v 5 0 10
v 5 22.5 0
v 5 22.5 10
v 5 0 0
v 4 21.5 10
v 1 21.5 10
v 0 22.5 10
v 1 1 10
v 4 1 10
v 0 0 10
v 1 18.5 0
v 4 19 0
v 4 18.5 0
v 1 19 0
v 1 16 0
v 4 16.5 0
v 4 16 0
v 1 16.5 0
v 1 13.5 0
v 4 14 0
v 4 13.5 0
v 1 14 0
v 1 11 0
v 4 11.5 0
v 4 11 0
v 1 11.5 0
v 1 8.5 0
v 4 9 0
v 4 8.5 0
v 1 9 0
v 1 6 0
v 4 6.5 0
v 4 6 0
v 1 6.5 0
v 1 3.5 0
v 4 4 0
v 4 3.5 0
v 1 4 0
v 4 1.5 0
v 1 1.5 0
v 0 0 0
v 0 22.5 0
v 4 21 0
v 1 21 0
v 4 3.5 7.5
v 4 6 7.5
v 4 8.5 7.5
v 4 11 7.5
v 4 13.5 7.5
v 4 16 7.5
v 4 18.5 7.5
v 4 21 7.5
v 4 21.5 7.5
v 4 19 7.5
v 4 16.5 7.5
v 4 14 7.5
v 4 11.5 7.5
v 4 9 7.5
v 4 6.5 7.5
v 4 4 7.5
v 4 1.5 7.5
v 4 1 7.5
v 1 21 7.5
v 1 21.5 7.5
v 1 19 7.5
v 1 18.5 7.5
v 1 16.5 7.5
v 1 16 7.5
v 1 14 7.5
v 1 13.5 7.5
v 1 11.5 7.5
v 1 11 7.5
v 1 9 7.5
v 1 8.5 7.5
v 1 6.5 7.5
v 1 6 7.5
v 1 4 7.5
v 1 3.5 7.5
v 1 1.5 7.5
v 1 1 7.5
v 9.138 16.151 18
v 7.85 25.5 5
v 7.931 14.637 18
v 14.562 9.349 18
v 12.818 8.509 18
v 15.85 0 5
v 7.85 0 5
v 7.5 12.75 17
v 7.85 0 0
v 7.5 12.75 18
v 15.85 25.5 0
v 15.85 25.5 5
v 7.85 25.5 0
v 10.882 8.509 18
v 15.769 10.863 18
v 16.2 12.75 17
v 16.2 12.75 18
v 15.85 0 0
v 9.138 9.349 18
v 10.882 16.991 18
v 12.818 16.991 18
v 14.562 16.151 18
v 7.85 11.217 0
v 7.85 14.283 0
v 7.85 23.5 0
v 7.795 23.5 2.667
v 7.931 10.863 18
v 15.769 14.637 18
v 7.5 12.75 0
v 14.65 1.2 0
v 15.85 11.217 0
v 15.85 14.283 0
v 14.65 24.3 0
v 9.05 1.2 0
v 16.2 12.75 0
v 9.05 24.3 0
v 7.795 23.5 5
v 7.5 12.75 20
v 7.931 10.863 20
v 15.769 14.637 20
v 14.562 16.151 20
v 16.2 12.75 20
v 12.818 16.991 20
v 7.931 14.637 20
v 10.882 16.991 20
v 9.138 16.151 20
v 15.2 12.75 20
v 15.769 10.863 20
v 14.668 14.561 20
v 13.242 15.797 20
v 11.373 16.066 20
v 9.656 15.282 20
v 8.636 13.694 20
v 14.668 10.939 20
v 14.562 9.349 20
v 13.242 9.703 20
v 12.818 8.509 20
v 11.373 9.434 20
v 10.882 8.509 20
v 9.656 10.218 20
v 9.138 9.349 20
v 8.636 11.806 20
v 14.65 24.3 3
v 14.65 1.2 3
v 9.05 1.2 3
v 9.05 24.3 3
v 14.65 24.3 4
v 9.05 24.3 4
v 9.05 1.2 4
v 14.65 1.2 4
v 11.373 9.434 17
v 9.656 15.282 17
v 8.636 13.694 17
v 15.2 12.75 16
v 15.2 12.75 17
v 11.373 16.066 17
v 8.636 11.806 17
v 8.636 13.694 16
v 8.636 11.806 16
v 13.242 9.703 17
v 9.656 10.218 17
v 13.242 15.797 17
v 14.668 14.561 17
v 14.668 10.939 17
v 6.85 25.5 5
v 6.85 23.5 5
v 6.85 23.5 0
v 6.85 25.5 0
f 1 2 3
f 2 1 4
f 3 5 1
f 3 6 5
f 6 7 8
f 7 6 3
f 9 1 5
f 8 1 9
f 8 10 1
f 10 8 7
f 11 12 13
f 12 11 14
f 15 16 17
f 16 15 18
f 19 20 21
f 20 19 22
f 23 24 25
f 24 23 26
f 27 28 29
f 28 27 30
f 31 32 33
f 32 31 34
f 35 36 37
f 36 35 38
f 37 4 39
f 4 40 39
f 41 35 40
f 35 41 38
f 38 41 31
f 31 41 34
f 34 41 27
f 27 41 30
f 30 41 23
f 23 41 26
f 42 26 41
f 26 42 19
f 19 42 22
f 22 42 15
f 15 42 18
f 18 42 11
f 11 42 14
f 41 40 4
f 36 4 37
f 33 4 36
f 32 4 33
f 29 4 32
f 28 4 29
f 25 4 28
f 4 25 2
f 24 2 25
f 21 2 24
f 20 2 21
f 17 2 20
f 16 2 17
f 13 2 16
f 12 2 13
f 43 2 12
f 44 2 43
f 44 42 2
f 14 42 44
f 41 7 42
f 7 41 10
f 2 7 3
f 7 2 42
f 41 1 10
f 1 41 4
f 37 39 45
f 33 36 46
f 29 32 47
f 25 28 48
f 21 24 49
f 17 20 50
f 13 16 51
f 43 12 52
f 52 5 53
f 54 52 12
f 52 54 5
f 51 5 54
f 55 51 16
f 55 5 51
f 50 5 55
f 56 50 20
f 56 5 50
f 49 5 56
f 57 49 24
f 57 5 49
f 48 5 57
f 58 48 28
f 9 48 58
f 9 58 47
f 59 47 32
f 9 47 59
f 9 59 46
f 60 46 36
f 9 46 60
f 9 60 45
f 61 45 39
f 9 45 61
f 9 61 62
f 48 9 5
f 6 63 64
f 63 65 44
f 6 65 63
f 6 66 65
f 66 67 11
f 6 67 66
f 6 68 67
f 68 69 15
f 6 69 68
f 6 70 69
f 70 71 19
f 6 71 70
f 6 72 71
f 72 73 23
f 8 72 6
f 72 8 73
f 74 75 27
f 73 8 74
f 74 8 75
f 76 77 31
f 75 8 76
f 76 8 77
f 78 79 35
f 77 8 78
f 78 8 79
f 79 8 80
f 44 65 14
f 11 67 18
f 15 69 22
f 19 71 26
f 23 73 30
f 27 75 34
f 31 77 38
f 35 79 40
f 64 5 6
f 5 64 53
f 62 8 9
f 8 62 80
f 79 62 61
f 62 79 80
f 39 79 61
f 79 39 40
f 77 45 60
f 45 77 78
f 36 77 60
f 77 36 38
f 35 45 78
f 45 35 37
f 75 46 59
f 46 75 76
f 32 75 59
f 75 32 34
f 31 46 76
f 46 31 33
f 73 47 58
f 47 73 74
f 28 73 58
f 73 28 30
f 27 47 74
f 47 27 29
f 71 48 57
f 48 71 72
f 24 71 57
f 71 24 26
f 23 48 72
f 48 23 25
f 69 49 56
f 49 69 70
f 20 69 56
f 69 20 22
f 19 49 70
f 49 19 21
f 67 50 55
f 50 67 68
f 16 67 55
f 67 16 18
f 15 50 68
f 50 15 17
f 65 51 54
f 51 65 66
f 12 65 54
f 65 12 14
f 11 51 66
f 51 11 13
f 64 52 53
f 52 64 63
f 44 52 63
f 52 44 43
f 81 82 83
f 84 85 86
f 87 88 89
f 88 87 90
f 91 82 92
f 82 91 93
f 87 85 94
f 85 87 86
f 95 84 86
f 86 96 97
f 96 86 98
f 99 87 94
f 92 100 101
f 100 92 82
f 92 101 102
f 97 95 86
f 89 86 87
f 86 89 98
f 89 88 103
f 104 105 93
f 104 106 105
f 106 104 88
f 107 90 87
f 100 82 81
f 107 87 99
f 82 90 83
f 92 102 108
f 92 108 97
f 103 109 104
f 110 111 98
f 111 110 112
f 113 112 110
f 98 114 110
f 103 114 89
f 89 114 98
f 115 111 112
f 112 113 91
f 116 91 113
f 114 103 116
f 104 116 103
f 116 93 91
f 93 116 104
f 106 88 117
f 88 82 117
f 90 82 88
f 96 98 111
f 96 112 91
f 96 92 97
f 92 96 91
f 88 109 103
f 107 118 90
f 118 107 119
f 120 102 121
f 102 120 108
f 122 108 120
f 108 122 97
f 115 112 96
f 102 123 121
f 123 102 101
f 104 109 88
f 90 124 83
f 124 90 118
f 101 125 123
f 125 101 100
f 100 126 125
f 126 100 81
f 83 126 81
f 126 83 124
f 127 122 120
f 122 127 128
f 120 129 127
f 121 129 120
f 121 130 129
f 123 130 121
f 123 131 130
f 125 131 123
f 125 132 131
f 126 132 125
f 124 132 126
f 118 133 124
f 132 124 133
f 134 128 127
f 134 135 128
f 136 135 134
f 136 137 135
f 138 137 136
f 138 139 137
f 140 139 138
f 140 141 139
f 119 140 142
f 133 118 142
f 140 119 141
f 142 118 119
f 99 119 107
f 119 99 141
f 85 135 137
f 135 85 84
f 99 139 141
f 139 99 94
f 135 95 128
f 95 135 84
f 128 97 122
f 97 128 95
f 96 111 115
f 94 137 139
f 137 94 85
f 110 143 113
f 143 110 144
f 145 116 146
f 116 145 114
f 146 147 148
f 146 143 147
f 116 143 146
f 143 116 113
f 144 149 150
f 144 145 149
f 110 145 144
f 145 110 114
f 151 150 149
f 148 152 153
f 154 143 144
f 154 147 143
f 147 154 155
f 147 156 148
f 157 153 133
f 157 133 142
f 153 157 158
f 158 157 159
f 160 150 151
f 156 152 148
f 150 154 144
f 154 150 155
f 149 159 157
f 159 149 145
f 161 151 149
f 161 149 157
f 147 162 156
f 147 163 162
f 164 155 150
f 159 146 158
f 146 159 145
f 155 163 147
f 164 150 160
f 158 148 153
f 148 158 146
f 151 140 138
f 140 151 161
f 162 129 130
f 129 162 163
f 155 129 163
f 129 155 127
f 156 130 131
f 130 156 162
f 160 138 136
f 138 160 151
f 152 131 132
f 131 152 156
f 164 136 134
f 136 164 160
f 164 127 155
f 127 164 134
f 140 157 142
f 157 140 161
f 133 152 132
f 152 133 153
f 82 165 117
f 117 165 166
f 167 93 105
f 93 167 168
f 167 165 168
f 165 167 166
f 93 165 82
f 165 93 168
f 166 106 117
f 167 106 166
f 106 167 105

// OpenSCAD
// Customize by adjusting the following variables
// All measurements in mm
// preview[view:north west, tilt:top]

/* [Header Shell] */

// The number of pins you want your cable shell to accommodate per column.
pins=8;

// Single (e.g. arduino uno) or Double column (arduino mega or beagleboard).
doubleColumn=0; //[0:Single Column, 1:Double Column]

// Choose whether wire separators (a wall between each conductor) will be printed. NOTE: Cura might not print the walls, check your layer view.  If Cura won't print the walls, I've found that slic3r and pronterface will.
wireSeparators=1; //[1:With Separators, 0:No Separators]

// Desired height of the header shell body.  ALL MEASUREMENTS ARE "mm"
height=10;

// Desired thickness of the shell walls.
wallThickness=1;

// MEASURED thickness of the plastic bar in the male header or plastic shell in the female header, assumed to be square for each wire (typical value is 2.5mm)
header=2.5;

//Typical female headers (for socket) require an extra mm in Y.  This accounts for that.
type=0; //[0:Plug, 1:Socket]

// Include an orientation indicator bump (automatically appears on correct shell, header or strain relief).
indicatorBump=1; //[1:With Indicator,0:Without Indicator]

// Orientation indicator position.  Choosing right or left will select which way the indicator faces.
indicatorSide=1; //[1:Rightward Orientation,0:Leftward Orientation]

// We need to account for nozzle diameter.  Enter the value for your printer here.  
nozzleDiameter=0.5;

/* [Strain Relief Shell] */

// Choose whether to include a separate strain relief shell.
strainRelief=1; //[1:Include Strain Relief Shell,0:No Strain Relief Shell]

// Enter desired radius for the exit hole from the strain relief shell.  Cat5 is generally 2.5 - 3 mm radius.  
cableRadius=2.85;

// Desired height of the strain relief shell.
strainHeight=20;

// Adjustment factors to perfect the fit between the strain relief shell and the header shell.  Lower numbers decrease the size of the inner cut (tighten), larger numbers increase the size of the inner cut (loosen).  Experiment until it is just right. 
cutAdjustmentX=-0.2;
cutAdjustmentY=-0.2;


/* [Hidden] */
//==== Don’t edit after this unless you want to change the way the script works ====
//==== basic calculations ==========================================================


outerBodyX=(2*wallThickness)+header+nozzleDiameter;
outerBodyY=(2*wallThickness)+(header*pins)+nozzleDiameter;
outerBodyZ=height;
innerBodyX=outerBodyX-(2*wallThickness);
innerBodyY=outerBodyY-(2*wallThickness);
innerBodyZ=height+2;

doubleOuterBodyX=(2*wallThickness)+(2*header)+nozzleDiameter;
doubleInnerBodyX=doubleOuterBodyX-(2*wallThickness);

innerCutTranslateX=wallThickness;
innerCutTranslateY=wallThickness;
innerCutTranslateZ=-1;

orientationIndicatorX=1;
orientationIndicatorY=2;
orientationIndicatorZ=height/2;

outerHullX=outerBodyX+(2*wallThickness)+(2*nozzleDiameter);
outerHullY=outerBodyY+(2*wallThickness)+(2*nozzleDiameter);
outerHullZ=orientationIndicatorZ;
innerHullX=outerBodyX+(2*nozzleDiameter);
innerHullY=outerBodyY+(2*nozzleDiameter);
innerHullZ=outerHullZ;

doubleOuterHullX=doubleOuterBodyX+(2*wallThickness)+(2*nozzleDiameter);
doubleInnerHullX=doubleOuterBodyX+(2*nozzleDiameter);

//==== the object ==================================================================

finalAssembly();

// draw main body
module mainBody()
{
	
	difference()
	{
		cube ([outerBodyX, outerBodyY+type, outerBodyZ]);
		translate([innerCutTranslateX, (innerCutTranslateY), innerCutTranslateZ]) 
		{
			cube ([innerBodyX, innerBodyY+type, innerBodyZ]);
		}
	}
}

// draw main body -- double column of pins
module mainBodyDouble()
{
	difference()
	{
		cube ([doubleOuterBodyX, outerBodyY+type, outerBodyZ]);
		translate([innerCutTranslateX, innerCutTranslateY, innerCutTranslateZ]) 
		{
			cube ([doubleInnerBodyX, innerBodyY+type, innerBodyZ]);
		}
	}
}

// orientation indicator on header shell (no strain relief)
module orientationIndicatorBump()
{
	if (indicatorBump==1)
	{
		color ("coral")
		{
			if (indicatorSide==1)
			{
				// orientation indicator bump
				translate([(orientationIndicatorX*-1), (outerBodyY-orientationIndicatorY), 0])
				{
					cube([orientationIndicatorX, orientationIndicatorY, orientationIndicatorZ]);
				}
			} else {
						// orientation indicator bump
				translate([(orientationIndicatorX*-1), 0, 0])
				{
					cube([orientationIndicatorX, orientationIndicatorY, orientationIndicatorZ]);
				}
			}
		}
	}
}

// orientation indicator on strain relief shell
module orientationIndicatorBumpStrainRelief()
{
	if (indicatorBump==1)
	{
		color ("coral")
		{
			if (indicatorSide==1 && doubleColumn==0)
			{
				translate([((outerBodyX+cableRadius)+(orientationIndicatorX*-1)), (outerHullY-orientationIndicatorY+type), 0])
				{
					cube([orientationIndicatorX, orientationIndicatorY, orientationIndicatorZ]);
				}
			}


			if (indicatorSide==0 && doubleColumn==0)
			{
				translate([((outerBodyX+cableRadius)+(orientationIndicatorX*-1)), type, 0])
				{
					cube([orientationIndicatorX, orientationIndicatorY, orientationIndicatorZ]);
				}
			}

			if (indicatorSide==1 && doubleColumn==1)
			{
				translate([((outerBodyX+cableRadius+header)+(orientationIndicatorX*-1)), (outerHullY-orientationIndicatorY+type), 0])
				{
					cube([orientationIndicatorX, orientationIndicatorY, orientationIndicatorZ]);
				}
			}


			if (indicatorSide==0 && doubleColumn==1)
			{
				translate([((outerBodyX+cableRadius+header)+(orientationIndicatorX*-1)), type, 0])
				{
					cube([orientationIndicatorX, orientationIndicatorY, orientationIndicatorZ]);
				}
			}
		}
	}
}

// if no wireseparators printed, the bar keeps the header in correct position
// single column version
module blockingBar()
{
	// internal blocking bar for lodging/glueing the header against
	translate([wallThickness, 0, 0])
	{
		color ("gold") cube([(innerBodyX/4), (outerBodyY+type), (outerBodyZ-header)]);
	}
}

// double column version of blocking bar
module blockingBarDouble()
{
	// internal blocking bar for lodging/glueing the header against
	translate([(wallThickness+innerBodyX-nozzleDiameter), 0, 0])
	{
		color ("gold") cube([(innerBodyX/4), (outerBodyY+type), (outerBodyZ-header)]);
	}
}

//wire Separators
module wireSeparators()
{
	start=wallThickness+(type/2);
	increment=header;
	end=outerBodyY-nozzleDiameter;

	for (wall=[start:increment:end] )
	{
		translate([0, wall, 0]){color("Orchid") cube([outerBodyX, nozzleDiameter, (outerBodyZ-header)], center=false);}
	}

}

//wire Separators -- double column of pins
module wireSeparatorsDouble()
{
	start=wallThickness+(type/2);
	increment=header;
	end=outerBodyY-nozzleDiameter;

	union()
	{
		for (wall=[start:increment:end] )
		{
			translate([0, wall, 0]){color("Orchid") cube([doubleOuterBodyX, nozzleDiameter, (outerBodyZ-header)], center=false);}
		}
		translate([((doubleOuterBodyX-nozzleDiameter)/2),0,0]){color("Orchid") cube([nozzleDiameter, outerBodyY, (outerBodyZ-header)], center=false);}
	}
}

// Strain relief shell -- single column
module strainReliefShell()
{
	//move to the side of the header shell
	translate([(outerBodyX+cableRadius),0,0]) 
	{
		difference()
		{
			union()
			{	
				hull() 
				{
					translate([0,0,0]) cube([outerHullX,outerHullY+type,outerHullZ]);
					translate([(outerHullX/2),(outerHullY/2)+(type/2),(strainHeight-3)]) cylinder(r=(cableRadius+wallThickness+nozzleDiameter),h=1);
				}
				translate([(outerHullX/2),(outerHullY/2)+(type/2),0]) cylinder(r=(cableRadius+wallThickness+nozzleDiameter),h=strainHeight);

			}

			union()
			{	
				translate([(wallThickness-cutAdjustmentX),(wallThickness-cutAdjustmentY),-1]) cube([(innerHullX+(2*cutAdjustmentX)),(innerHullY+(2*cutAdjustmentY)+type),(innerHullZ)]);
				hull() 
				{
					translate([(wallThickness-cutAdjustmentX),(wallThickness-cutAdjustmentY),(innerHullZ-2)]) cube([(innerHullX+(2*cutAdjustmentX)),(innerHullY+(2*cutAdjustmentY)+type),1]);
					translate([(wallThickness+(innerHullX/2)),(wallThickness+(innerHullY/2)+(type/2)),(strainHeight-4)]) cylinder(r=(cableRadius+nozzleDiameter),h=1);
				}
				translate([(wallThickness+(innerHullX/2)),(wallThickness+(innerHullY/2)+(type/2)),strainHeight-4]) cylinder(r=(cableRadius+nozzleDiameter),h=strainHeight);
			}
		}
	}
}

// Strain relief shell -- double column
module strainReliefShellDouble()
{
	//move to the side of the header shell
	translate([(doubleOuterBodyX+cableRadius),0,0]) 
	{
		difference()
		{
			union()
			{	
				hull() 
				{
					translate([0,0,0]) cube([doubleOuterHullX,outerHullY+type,outerHullZ]);
					translate([(doubleOuterHullX/2),(outerHullY/2)+(type/2),(strainHeight-3)]) cylinder(r=(cableRadius+wallThickness+nozzleDiameter),h=1);
				}
				translate([(doubleOuterHullX/2),(outerHullY/2)+(type/2),0]) cylinder(r=(cableRadius+wallThickness+nozzleDiameter),h=strainHeight);
			}

			union()
			{	
				translate([(wallThickness-cutAdjustmentX),(wallThickness-cutAdjustmentY),-1]) cube([(doubleInnerHullX+(2*cutAdjustmentX)),(innerHullY+(2*cutAdjustmentY)+type),innerHullZ]);
				hull() 
				{
					translate([(wallThickness-cutAdjustmentX),(wallThickness-cutAdjustmentY),(innerHullZ-2)]) cube([(doubleInnerHullX+(2*cutAdjustmentX)),(innerHullY+(2*cutAdjustmentY)+type),1]);
					translate([(wallThickness+(doubleInnerHullX/2)),(wallThickness+(innerHullY/2)+(type/2)),(strainHeight-4)]) cylinder(r=(cableRadius+nozzleDiameter),h=1);
				}
				translate([(wallThickness+(doubleInnerHullX/2)),(wallThickness+(innerHullY/2)+(type/2)),(strainHeight-4)]) cylinder(r=(cableRadius+nozzleDiameter),h=strainHeight);
			}
		}
	}
}

// put the parts together
module finalAssembly()
{
	if (wireSeparators==0 && strainRelief==0 && doubleColumn==0)
	{
		union()
		{
			mainBody();
			blockingBar();
			orientationIndicatorBump();
		}
	}
	
	if (wireSeparators==1 && strainRelief==0 && doubleColumn==0)
	{
		union()
		{
			mainBody();
			orientationIndicatorBump();
			wireSeparators();
		}
	}
	
	if (wireSeparators==0 && strainRelief==1 && doubleColumn==0)
	{
		union()
		{
			mainBody();
			blockingBar();
			strainReliefShell();
			orientationIndicatorBumpStrainRelief();

		}
	}
	
	if (wireSeparators==1 && strainRelief==1 && doubleColumn==0)
	{
		union()
		{
			mainBody();
			wireSeparators();
			strainReliefShell();
			orientationIndicatorBumpStrainRelief();
		}
	}
	
	if (wireSeparators==0 && strainRelief==0 && doubleColumn==1)
	{
		union()
		{
			mainBodyDouble();
			blockingBar();
			blockingBarDouble();
			orientationIndicatorBump();
		}
	}
	
	if (wireSeparators==1 && strainRelief==0 && doubleColumn==1)
	{
		union()
		{
			mainBodyDouble();
			orientationIndicatorBump();
			wireSeparatorsDouble();
		}
	}
	
	if (wireSeparators==0 && strainRelief==1 && doubleColumn==1)
	{
		union()
		{
			mainBodyDouble();
			blockingBar();
			blockingBarDouble();
			strainReliefShellDouble();
			orientationIndicatorBumpStrainRelief();
		}
	}
	
	if (wireSeparators==1 && strainRelief==1 && doubleColumn==1)
	{
		union()
		{
			mainBodyDouble();
			wireSeparatorsDouble();
			strainReliefShellDouble();
			orientationIndicatorBumpStrainRelief();
		}
	}
	
}
